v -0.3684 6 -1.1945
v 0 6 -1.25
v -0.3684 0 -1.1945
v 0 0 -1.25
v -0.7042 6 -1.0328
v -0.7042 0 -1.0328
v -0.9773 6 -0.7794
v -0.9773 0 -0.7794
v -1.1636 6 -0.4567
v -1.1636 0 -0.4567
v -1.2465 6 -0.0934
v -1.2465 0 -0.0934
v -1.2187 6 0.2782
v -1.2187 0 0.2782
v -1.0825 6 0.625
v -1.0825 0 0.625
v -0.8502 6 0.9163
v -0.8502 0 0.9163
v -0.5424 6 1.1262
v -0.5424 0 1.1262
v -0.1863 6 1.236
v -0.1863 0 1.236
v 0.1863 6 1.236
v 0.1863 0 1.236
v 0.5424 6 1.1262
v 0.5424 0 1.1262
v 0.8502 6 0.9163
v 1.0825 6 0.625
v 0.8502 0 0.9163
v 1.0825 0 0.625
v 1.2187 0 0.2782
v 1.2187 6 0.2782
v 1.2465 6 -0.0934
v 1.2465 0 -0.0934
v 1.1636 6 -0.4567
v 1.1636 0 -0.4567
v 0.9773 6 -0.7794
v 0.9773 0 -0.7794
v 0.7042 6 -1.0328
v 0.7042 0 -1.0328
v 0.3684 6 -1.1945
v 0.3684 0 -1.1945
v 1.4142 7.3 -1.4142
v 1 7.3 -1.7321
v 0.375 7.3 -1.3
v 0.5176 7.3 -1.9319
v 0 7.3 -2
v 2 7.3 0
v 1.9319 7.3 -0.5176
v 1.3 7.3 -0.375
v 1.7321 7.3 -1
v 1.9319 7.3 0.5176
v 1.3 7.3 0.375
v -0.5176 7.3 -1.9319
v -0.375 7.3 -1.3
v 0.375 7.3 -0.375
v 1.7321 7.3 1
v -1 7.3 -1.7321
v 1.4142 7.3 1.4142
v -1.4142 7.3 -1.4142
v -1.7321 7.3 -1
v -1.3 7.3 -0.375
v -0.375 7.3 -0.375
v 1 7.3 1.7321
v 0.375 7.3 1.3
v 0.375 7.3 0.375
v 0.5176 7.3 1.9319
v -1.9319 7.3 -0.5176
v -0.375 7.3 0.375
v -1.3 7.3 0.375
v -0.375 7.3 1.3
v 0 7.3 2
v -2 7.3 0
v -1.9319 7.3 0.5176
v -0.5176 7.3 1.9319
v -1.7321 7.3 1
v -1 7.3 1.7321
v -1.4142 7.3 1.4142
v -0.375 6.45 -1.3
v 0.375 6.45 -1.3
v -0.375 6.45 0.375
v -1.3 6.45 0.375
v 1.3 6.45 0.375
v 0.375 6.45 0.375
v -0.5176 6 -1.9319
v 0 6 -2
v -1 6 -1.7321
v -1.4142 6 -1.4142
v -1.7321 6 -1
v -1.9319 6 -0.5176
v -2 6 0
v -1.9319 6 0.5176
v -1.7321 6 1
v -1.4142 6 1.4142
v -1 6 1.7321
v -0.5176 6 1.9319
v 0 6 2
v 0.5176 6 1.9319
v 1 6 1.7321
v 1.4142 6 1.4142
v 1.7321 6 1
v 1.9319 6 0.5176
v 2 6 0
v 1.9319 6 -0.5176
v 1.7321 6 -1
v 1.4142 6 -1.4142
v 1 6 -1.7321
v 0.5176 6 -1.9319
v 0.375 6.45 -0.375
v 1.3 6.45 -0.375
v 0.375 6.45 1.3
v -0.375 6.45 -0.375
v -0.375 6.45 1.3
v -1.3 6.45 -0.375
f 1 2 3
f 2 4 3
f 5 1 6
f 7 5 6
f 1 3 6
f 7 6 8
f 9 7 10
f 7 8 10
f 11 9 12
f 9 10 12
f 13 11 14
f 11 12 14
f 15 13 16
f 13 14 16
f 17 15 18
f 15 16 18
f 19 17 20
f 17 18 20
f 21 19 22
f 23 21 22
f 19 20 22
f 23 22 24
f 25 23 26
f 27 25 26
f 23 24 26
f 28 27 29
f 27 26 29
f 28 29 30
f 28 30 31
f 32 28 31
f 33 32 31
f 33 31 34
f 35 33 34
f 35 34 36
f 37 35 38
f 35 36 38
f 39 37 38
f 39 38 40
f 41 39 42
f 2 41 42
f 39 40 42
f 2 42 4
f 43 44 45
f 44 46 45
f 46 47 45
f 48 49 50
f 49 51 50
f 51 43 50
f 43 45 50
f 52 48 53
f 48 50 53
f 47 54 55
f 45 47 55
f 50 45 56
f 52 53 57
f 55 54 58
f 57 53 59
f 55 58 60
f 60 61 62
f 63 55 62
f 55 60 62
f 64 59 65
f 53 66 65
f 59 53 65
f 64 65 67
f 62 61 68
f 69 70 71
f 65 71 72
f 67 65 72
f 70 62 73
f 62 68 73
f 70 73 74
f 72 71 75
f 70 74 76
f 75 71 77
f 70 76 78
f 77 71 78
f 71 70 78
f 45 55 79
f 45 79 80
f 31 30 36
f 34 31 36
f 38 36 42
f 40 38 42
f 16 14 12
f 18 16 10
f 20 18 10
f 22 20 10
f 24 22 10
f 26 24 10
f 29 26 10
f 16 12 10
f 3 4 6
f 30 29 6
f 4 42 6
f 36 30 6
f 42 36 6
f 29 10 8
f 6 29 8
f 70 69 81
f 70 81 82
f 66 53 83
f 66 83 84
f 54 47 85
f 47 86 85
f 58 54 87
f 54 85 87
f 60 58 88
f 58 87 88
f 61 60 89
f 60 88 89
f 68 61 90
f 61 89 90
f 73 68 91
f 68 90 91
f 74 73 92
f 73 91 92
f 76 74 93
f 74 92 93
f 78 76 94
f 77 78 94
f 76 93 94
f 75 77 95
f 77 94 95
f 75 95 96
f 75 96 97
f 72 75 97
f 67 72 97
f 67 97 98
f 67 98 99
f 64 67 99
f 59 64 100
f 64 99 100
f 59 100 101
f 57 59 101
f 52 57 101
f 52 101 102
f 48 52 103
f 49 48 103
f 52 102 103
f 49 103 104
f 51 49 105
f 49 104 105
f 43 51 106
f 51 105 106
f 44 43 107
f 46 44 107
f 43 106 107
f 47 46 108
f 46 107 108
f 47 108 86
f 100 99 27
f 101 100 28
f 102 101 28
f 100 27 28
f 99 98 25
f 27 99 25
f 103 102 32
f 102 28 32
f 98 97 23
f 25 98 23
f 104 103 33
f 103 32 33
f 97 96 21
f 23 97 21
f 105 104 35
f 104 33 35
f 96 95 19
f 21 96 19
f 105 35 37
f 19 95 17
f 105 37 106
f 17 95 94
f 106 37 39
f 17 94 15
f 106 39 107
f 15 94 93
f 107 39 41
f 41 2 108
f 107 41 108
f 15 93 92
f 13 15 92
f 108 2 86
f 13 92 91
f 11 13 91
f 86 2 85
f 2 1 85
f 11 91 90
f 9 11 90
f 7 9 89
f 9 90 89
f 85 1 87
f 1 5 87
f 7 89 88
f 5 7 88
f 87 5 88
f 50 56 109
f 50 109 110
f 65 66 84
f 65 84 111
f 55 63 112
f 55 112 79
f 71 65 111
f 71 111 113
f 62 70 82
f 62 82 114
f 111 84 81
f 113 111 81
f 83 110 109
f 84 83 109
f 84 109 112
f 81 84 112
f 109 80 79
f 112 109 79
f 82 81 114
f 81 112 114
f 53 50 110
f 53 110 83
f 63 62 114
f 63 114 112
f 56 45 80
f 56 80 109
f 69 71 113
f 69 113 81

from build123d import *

# Parameters (mm, degrees)
CUT_EXTRUDE1_DEPTH = 0.85


with BuildPart() as part:
    # Sketch1 → Revolve1 (revolve)
    with BuildSketch(Plane(origin=(0, 0, 0), x_dir=(0, 0, -1), z_dir=(1, 0, 0))):
        Polygon((0, 7.3), (2, 7.3), (2, 6), (1.25, 6), (1.25, 0), (0, 0), align=None)
    revolve(axis=Axis((0, 0, 0), (0, 1, 0)))

    # Sketch4 → Cut-Extrude1 (cut)
    with BuildSketch(Plane(origin=(0, 7.3, 0), x_dir=(1, 0, 0), z_dir=(0, 1, 0))):
        Polygon((0.375, -0.375), (0.375, -1.3), (-0.375, -1.3), (-0.375, -0.375), (-1.3, -0.375), (-1.3, 0.375), (-0.375, 0.375), (-0.375, 1.3), (0.375, 1.3), (0.375, 0.375), (1.3, 0.375), (1.3, -0.375), align=None)
    extrude(amount=-CUT_EXTRUDE1_DEPTH, mode=Mode.SUBTRACT)


solid = part.part
